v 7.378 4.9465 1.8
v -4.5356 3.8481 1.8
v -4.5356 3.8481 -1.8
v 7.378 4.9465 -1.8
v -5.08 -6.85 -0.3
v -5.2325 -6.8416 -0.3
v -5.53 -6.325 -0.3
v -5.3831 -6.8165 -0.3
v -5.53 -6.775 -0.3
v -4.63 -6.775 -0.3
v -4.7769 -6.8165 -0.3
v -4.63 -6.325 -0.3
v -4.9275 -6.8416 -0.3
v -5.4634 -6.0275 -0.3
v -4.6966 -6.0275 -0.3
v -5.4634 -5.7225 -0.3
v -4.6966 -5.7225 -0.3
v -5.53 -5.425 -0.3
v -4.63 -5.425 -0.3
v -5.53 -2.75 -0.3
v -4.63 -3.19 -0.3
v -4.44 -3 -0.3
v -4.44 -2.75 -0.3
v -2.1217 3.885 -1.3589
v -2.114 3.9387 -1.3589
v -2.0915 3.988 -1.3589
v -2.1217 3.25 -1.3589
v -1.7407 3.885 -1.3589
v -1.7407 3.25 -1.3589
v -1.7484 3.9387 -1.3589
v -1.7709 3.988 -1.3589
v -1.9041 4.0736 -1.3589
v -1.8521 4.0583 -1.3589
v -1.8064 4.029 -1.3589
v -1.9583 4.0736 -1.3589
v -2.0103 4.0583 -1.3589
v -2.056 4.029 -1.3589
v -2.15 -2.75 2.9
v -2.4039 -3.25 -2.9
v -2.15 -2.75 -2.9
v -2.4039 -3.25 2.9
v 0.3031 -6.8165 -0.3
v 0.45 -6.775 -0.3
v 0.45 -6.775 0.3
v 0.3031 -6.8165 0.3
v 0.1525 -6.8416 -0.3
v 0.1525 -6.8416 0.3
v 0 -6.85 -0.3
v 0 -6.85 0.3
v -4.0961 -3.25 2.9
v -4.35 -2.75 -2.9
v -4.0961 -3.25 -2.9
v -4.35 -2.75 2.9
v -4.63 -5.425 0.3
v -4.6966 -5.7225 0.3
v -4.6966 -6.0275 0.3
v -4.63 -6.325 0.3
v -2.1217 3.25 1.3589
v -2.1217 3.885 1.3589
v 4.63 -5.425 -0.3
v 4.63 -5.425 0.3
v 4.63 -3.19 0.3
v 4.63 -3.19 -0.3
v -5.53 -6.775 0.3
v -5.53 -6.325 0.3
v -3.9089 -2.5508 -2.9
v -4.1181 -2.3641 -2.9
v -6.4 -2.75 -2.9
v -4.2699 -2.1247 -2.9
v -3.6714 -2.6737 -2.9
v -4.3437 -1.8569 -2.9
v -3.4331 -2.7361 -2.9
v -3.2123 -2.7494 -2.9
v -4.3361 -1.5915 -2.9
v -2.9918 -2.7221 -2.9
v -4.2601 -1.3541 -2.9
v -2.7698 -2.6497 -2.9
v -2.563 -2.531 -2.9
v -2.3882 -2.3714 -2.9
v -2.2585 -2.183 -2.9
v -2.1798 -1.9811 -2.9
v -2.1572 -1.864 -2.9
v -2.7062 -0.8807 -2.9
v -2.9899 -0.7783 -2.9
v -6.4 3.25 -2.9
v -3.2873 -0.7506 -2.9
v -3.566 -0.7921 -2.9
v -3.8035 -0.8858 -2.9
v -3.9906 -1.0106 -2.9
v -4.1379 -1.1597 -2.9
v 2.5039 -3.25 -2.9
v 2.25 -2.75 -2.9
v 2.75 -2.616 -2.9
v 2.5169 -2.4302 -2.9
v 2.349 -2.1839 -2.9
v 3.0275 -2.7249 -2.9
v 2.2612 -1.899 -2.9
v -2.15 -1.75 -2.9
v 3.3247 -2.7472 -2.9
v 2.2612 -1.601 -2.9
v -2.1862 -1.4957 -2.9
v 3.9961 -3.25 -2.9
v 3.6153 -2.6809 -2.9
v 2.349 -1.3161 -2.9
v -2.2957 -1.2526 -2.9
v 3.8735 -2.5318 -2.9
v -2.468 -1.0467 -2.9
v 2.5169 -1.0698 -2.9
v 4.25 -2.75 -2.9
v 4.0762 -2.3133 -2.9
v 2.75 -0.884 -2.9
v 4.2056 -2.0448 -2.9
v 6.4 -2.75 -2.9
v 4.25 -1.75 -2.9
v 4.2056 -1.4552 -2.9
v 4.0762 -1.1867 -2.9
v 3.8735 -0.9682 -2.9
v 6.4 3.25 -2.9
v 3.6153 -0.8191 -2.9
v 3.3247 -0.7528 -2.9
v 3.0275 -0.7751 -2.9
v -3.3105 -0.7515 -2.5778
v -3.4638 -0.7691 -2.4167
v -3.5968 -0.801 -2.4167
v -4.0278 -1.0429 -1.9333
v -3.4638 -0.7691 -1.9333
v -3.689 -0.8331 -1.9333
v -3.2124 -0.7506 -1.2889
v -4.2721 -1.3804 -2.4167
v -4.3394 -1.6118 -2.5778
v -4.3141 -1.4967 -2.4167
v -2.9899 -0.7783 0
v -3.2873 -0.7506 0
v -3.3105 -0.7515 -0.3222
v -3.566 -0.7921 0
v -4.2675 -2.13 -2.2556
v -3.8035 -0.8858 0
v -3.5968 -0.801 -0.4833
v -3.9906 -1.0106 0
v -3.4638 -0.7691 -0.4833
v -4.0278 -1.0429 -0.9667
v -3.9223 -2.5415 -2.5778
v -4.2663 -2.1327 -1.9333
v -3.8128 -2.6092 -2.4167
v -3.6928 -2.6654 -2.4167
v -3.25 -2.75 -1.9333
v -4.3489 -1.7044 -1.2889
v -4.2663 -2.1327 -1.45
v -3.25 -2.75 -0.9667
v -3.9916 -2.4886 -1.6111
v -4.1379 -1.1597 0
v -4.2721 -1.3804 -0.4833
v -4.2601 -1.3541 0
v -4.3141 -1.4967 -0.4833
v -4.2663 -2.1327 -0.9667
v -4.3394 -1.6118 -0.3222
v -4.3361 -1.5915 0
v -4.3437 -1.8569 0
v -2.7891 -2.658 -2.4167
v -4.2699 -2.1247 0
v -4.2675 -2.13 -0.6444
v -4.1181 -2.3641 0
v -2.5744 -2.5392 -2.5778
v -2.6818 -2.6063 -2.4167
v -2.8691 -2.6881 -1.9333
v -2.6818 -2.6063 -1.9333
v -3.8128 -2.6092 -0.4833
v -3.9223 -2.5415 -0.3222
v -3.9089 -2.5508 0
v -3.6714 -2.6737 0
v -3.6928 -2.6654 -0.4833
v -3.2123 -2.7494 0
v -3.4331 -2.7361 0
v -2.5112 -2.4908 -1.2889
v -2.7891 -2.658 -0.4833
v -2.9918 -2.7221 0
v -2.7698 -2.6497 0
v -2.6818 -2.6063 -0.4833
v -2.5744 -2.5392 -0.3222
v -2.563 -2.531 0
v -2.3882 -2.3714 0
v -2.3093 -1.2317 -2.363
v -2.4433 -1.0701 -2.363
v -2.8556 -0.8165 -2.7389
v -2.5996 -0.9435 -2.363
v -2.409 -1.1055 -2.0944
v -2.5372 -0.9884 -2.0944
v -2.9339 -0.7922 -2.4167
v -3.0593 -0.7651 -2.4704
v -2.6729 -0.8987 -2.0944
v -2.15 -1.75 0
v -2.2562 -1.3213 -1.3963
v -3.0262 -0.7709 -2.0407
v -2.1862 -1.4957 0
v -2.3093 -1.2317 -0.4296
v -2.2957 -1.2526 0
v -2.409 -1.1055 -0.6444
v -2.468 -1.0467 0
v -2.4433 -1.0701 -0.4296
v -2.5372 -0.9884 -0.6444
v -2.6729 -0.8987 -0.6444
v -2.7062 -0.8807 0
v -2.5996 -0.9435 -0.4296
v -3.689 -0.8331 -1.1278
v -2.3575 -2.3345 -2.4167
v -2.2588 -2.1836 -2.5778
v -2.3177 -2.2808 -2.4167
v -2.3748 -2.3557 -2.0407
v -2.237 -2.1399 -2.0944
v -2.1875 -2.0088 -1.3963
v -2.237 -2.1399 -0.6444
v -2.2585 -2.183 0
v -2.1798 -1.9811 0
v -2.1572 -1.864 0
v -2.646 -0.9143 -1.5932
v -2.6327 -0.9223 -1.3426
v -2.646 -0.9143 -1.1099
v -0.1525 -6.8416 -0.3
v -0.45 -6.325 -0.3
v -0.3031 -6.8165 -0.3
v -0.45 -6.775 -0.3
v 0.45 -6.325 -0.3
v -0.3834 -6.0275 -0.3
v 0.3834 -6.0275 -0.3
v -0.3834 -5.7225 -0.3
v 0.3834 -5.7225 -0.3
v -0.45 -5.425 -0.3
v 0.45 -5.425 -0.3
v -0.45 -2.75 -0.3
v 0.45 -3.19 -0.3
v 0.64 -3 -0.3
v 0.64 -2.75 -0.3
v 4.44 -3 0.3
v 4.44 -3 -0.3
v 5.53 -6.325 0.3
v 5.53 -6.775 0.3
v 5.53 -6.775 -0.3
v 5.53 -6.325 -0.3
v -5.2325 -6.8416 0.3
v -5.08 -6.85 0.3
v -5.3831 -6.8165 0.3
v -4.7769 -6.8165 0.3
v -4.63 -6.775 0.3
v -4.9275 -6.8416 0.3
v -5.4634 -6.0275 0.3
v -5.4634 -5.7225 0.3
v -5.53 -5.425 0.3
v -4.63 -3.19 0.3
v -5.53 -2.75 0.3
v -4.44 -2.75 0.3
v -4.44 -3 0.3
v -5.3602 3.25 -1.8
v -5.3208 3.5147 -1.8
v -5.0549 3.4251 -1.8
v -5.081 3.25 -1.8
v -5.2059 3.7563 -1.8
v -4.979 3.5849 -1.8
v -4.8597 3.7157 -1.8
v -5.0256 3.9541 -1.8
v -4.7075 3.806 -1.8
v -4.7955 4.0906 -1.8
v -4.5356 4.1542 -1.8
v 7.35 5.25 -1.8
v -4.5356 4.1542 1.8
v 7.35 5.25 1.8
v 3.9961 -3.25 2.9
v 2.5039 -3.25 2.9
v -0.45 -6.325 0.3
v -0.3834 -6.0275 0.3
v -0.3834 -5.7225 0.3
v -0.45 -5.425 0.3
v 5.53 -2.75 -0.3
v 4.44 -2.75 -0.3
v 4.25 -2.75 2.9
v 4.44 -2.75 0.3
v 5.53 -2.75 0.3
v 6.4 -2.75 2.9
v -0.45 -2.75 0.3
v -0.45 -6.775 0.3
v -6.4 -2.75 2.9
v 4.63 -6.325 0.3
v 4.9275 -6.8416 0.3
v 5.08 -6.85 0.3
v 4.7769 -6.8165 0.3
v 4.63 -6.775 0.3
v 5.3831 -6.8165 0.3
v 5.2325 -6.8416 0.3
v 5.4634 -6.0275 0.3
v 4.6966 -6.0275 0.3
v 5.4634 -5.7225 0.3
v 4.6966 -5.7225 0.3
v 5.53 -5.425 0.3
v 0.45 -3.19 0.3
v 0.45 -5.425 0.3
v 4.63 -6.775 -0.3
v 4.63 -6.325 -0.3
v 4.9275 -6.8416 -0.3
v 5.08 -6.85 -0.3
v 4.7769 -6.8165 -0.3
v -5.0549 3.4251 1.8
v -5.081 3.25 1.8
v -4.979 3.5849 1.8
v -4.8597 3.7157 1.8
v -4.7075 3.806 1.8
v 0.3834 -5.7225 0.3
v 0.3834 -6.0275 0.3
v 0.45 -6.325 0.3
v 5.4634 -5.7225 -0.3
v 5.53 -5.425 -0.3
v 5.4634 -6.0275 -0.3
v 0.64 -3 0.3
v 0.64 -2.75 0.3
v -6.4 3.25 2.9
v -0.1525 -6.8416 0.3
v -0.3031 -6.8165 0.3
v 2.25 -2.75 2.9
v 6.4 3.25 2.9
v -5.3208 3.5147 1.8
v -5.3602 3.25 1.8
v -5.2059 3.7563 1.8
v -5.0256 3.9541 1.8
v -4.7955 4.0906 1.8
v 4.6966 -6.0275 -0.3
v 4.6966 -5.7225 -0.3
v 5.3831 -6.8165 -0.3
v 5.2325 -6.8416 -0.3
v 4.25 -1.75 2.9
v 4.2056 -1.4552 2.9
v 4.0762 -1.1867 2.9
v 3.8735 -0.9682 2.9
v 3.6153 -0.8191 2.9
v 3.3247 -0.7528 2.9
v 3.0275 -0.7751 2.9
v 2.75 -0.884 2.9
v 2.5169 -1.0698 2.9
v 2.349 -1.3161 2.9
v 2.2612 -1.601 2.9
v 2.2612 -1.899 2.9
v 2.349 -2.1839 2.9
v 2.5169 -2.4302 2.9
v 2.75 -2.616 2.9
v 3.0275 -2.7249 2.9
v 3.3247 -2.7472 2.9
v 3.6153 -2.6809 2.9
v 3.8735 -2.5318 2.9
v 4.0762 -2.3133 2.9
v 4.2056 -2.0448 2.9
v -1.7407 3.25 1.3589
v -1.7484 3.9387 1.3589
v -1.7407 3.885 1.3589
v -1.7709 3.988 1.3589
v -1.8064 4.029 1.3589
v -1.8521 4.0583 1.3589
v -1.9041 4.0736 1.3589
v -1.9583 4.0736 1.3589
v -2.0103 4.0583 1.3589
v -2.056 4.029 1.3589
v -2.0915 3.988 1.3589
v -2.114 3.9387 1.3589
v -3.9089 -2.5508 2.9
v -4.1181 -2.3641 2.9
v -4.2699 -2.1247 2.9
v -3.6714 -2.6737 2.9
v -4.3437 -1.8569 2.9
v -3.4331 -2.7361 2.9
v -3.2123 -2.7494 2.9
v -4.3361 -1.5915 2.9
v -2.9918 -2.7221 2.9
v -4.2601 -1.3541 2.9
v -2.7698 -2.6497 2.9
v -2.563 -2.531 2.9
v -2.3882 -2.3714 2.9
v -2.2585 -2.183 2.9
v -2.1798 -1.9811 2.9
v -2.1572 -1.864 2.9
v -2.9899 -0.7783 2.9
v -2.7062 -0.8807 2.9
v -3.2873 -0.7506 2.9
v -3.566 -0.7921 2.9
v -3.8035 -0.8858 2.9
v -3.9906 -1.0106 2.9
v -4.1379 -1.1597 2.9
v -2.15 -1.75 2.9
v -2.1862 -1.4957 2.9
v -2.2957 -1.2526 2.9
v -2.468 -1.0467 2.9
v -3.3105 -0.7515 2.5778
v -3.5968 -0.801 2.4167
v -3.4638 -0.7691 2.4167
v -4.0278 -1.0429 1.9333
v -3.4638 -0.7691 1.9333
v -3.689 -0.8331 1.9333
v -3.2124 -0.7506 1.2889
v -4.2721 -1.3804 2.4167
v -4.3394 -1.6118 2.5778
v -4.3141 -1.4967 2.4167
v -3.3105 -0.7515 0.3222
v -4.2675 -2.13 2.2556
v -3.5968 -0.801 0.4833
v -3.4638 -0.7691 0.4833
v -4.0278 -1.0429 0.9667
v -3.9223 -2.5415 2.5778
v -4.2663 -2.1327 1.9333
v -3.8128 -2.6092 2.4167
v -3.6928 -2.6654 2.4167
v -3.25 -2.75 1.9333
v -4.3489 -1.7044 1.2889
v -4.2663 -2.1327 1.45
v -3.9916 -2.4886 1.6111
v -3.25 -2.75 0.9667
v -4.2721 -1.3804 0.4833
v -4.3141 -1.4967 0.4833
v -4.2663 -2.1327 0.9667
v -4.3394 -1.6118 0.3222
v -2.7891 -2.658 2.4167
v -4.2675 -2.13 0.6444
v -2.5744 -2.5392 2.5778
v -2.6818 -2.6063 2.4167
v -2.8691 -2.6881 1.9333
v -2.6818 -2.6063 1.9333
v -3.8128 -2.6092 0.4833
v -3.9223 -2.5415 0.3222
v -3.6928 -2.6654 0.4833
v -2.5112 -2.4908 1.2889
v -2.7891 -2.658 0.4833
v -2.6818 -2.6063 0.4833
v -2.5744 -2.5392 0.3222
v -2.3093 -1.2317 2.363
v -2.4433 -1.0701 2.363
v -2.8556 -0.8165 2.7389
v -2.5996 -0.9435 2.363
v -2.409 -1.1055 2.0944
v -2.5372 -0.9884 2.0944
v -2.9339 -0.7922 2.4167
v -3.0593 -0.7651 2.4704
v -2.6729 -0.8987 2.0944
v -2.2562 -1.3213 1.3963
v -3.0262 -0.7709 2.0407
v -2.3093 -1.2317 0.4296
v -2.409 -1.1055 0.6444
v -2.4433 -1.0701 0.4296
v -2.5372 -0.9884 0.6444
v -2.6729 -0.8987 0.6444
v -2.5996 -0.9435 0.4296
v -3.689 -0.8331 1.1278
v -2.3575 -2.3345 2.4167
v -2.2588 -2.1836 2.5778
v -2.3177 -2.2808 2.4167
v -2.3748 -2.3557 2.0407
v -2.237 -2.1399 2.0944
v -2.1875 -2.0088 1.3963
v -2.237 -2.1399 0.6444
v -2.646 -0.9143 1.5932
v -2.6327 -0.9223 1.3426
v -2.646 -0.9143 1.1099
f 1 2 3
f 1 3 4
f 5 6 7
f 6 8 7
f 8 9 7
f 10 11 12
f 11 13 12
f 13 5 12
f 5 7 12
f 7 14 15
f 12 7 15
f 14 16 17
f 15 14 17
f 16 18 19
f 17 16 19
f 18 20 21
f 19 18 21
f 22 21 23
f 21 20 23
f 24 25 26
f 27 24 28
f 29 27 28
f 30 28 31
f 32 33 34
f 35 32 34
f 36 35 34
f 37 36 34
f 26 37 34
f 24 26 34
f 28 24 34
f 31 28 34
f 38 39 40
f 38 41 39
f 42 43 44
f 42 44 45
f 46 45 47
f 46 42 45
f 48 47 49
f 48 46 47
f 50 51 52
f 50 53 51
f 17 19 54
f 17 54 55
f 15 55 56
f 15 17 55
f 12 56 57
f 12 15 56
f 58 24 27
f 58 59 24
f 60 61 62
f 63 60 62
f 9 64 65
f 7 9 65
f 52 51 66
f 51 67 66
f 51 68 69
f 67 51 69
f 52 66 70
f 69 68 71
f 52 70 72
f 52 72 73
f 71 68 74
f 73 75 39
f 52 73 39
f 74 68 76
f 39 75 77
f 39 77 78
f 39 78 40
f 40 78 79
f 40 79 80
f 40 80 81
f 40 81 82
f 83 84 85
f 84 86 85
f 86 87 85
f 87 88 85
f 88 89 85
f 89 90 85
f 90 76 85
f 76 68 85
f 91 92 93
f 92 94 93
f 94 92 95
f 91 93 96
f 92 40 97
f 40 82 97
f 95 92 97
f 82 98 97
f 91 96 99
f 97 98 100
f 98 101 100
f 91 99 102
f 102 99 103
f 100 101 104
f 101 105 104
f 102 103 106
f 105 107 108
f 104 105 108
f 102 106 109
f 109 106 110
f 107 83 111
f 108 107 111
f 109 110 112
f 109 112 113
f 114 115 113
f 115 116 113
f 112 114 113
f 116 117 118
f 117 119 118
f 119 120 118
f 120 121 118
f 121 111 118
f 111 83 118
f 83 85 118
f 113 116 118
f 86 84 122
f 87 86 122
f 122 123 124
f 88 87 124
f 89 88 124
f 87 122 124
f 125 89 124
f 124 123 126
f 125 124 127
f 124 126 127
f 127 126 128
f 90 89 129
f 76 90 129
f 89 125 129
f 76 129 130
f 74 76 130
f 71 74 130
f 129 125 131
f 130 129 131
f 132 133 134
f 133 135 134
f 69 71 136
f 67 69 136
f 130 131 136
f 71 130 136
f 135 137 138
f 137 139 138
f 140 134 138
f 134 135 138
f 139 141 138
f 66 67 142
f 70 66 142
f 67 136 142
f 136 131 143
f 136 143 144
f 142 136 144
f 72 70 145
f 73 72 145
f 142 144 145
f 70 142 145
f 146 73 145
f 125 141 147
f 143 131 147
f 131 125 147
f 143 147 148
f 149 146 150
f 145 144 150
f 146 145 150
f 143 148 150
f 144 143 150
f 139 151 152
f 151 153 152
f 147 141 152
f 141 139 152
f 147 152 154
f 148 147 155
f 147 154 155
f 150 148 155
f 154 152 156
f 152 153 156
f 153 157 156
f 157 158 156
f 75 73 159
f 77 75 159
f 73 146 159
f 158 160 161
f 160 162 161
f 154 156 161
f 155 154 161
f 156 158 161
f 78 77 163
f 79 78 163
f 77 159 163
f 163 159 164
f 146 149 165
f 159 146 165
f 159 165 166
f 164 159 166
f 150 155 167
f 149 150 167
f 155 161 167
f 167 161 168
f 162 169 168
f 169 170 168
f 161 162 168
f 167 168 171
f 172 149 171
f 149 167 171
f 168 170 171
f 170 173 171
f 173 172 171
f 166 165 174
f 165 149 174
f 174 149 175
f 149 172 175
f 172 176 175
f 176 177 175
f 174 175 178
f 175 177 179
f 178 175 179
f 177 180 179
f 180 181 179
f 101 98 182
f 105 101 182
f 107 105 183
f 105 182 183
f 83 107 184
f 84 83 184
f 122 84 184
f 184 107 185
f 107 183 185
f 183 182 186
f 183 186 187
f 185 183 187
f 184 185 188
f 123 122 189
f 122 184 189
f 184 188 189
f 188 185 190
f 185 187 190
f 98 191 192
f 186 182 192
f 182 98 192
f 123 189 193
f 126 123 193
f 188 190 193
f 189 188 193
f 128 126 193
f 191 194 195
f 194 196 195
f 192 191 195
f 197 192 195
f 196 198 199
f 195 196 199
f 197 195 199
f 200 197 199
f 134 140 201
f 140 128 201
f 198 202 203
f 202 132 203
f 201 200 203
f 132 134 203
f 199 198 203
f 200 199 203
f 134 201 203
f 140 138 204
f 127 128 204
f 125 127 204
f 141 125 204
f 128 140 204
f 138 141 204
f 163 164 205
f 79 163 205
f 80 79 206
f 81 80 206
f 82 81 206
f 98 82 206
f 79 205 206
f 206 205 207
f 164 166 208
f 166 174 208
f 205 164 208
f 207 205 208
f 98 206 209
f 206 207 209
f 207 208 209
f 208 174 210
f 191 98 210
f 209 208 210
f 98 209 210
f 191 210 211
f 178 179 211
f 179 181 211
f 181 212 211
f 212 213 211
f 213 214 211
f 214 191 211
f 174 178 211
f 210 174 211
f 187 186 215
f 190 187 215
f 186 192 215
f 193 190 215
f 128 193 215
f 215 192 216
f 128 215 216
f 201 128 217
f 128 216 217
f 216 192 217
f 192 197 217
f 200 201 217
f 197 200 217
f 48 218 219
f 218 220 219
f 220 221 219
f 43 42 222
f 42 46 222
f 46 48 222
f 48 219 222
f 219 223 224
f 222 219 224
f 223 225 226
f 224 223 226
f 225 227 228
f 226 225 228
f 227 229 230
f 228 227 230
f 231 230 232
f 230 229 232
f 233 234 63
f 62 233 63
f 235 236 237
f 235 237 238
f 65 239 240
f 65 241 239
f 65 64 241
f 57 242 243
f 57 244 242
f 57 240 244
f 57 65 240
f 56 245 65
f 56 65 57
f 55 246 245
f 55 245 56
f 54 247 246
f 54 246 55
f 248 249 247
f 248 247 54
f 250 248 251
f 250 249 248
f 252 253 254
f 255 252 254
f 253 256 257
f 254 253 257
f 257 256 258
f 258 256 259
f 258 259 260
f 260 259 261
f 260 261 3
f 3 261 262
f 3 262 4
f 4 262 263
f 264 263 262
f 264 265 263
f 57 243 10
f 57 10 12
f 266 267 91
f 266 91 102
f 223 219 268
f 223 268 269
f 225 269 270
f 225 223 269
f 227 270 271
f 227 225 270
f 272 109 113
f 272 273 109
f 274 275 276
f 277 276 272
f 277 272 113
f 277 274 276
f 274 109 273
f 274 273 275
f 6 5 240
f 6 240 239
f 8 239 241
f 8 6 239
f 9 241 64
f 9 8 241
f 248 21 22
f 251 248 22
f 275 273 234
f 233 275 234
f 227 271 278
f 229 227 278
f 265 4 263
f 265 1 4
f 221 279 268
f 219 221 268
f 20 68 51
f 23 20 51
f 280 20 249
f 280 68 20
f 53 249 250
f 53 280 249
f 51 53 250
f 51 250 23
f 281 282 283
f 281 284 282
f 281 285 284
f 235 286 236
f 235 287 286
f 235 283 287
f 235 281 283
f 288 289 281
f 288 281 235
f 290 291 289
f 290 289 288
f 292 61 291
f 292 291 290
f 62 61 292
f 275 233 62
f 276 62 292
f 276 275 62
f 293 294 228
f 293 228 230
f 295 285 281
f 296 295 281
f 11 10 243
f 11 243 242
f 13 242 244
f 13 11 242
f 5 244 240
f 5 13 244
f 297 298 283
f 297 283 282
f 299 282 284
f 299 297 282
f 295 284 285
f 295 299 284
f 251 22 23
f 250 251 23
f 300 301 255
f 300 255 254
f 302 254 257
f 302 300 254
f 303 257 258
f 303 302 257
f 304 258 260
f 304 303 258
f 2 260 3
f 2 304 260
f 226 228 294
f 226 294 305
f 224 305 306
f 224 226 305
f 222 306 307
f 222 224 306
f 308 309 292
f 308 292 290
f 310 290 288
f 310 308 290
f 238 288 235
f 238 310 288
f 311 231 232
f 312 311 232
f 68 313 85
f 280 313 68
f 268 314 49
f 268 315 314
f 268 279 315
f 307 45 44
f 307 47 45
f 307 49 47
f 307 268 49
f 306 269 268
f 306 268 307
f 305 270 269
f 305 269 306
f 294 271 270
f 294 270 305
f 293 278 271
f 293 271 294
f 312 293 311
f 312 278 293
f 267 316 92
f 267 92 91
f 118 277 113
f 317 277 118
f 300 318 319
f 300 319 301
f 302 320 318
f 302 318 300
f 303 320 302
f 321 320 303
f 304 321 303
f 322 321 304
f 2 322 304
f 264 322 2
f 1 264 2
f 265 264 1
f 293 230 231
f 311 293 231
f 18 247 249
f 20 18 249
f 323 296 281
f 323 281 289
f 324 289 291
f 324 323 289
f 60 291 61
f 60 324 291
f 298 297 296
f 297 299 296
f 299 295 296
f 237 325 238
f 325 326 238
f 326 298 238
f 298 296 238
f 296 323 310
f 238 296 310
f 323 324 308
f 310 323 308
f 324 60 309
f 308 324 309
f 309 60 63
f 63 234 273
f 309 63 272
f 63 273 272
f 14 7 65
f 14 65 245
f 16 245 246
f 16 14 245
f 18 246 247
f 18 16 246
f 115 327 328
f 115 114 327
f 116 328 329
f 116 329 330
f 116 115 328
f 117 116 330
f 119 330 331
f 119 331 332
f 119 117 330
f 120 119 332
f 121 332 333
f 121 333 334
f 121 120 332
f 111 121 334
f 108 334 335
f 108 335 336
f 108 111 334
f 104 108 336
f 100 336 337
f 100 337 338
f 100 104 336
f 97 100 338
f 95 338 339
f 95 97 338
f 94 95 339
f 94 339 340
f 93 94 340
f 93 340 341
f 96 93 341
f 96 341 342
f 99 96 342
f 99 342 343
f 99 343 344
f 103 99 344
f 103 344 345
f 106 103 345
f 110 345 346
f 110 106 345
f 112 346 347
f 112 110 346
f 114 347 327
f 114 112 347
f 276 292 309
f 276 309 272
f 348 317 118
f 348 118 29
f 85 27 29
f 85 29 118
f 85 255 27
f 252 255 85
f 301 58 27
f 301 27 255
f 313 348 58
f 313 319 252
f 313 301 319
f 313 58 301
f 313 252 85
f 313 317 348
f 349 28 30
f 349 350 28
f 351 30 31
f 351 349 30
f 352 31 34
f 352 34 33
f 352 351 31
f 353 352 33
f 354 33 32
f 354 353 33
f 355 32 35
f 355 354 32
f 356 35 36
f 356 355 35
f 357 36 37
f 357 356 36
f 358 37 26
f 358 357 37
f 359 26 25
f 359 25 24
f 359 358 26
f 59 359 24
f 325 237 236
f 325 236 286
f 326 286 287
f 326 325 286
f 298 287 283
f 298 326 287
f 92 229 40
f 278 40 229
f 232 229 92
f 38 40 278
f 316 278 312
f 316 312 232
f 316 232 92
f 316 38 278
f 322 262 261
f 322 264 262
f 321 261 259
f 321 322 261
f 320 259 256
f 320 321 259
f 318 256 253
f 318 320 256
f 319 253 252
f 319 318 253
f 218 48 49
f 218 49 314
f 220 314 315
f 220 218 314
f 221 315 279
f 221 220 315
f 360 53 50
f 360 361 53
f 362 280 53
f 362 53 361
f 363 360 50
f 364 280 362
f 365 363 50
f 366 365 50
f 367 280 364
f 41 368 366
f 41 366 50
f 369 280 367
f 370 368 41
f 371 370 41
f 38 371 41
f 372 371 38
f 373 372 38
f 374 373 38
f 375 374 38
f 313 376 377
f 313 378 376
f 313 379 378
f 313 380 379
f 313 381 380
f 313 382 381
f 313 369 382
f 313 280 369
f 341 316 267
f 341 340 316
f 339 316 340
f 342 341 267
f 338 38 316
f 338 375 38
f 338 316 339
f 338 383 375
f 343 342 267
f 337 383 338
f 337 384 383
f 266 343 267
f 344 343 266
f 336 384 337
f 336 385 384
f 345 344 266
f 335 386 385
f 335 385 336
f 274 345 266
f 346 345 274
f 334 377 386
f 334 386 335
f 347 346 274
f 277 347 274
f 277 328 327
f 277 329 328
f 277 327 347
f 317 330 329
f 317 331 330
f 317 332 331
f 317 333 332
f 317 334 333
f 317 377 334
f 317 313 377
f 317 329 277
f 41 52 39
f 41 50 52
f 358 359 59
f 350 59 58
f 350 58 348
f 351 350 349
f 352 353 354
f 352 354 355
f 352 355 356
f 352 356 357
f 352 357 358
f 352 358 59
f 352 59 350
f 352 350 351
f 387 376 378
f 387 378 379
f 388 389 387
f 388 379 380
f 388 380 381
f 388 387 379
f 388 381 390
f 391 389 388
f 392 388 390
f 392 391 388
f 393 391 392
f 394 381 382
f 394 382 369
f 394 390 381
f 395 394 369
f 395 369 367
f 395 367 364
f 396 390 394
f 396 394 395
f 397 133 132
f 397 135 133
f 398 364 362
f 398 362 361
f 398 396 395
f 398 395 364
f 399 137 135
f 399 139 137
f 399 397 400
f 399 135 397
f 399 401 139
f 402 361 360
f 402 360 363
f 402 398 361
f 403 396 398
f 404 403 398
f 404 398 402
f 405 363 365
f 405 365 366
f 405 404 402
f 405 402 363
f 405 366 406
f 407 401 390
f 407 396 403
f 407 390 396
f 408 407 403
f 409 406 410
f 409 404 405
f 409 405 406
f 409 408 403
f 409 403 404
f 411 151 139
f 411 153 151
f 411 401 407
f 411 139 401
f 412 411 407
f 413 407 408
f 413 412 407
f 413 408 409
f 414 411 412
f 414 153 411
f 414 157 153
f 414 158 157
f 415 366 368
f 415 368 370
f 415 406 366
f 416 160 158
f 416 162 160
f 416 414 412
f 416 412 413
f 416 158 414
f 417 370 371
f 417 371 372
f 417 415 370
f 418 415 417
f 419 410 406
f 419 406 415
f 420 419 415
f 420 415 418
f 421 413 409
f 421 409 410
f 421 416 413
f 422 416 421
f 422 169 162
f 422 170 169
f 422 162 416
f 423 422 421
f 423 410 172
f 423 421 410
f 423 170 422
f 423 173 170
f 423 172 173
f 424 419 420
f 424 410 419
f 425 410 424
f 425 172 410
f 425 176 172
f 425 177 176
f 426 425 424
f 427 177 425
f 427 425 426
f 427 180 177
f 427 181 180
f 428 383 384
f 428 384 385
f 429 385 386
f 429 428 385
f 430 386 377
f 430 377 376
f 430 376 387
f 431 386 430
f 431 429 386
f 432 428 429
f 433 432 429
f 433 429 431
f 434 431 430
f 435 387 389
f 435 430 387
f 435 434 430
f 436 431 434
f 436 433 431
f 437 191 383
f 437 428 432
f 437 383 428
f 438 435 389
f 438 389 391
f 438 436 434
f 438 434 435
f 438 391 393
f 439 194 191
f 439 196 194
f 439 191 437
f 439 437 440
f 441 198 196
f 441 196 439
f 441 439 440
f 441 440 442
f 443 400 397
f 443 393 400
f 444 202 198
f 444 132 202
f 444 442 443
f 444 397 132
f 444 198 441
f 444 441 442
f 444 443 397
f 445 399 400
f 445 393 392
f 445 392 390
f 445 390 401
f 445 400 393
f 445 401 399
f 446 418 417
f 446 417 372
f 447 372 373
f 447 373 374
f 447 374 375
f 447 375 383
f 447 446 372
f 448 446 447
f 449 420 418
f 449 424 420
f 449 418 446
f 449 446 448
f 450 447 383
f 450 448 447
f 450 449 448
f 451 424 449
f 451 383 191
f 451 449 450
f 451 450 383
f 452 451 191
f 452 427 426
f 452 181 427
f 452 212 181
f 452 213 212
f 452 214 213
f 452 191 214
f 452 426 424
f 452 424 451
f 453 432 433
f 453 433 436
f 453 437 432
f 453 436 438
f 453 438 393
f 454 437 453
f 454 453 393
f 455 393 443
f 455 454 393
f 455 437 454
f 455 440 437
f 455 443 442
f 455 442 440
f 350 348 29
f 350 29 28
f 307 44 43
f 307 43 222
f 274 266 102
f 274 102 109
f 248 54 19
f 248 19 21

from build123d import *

# Parameters (mm, degrees)
SKETCH1_R               = 1
BOSS_EXTRUDE1_DEPTH     = 2.9
BOSS_EXTRUDE2_DEPTH     = 1.8
BOSS_EXTRUDE3_DEPTH     = 1.3589
SKETCH1_5_W             = 0.9
SKETCH1_5_H             = 4.1
BOSS_EXTRUDE4_DEPTH     = 0.3
BOSS_EXTRUDE4_2_DEPTH   = 0.3
BOSS_EXTRUDE4_3_DEPTH   = 0.3
CUT_EXTRUDE4_DEPTH      = 11.476981306
CUT_EXTRUDE4_DEPTH_BACK = 11.476981306
CUT_EXTRUDE5_DEPTH      = 11.476981306
CUT_EXTRUDE5_DEPTH_BACK = 11.476981306
CUT_EXTRUDE6_DEPTH      = 11.476981306
CUT_EXTRUDE6_DEPTH_BACK = 11.476981306
BOSS_EXTRUDE5_START     = -0.3
BOSS_EXTRUDE5_DEPTH     = 0.6


with BuildPart() as part:
    # Sketch1 → Boss-Extrude1 (new, symmetric)
    with BuildSketch(Plane.XY):
        Polygon((-2.15, -2.75), (2.25, -2.75), (2.50390625, -3.25), (3.99609375, -3.25), (4.25, -2.75), (6.4, -2.75), (6.4, 3.25), (-6.4, 3.25), (-6.4, -2.75), (-4.35, -2.75), (-4.09609375, -3.25), (-2.40390625, -3.25), align=None)
        with BuildLine():
            add(Edge.make_bspline(
                [(-3.25, -2.75), (-2.15, -2.75), (-2.15, -1.75)],
                knots=[4.71238898, 4.71238898, 4.71238898, 6.283185307, 6.283185307, 6.283185307], degree=2, weights=[1, 0.707106781, 1]))
            add(Edge.make_bspline(
                [(-2.15, -1.75), (-2.15, 0.664213562), (-4.027817459, -1.042893219), (-5.905634919, -2.75), (-3.25, -2.75)],
                knots=[0, 0, 0, 2.35619449, 2.35619449, 4.71238898, 4.71238898, 4.71238898], degree=2, weights=[1, 0.382683432, 1, 0.382683432, 1]))
        make_face(mode=Mode.SUBTRACT)
        with Locations((3.25, -1.75)):
            Circle(SKETCH1_R, mode=Mode.SUBTRACT)
    extrude(amount=BOSS_EXTRUDE1_DEPTH, both=True)

    # Sketch1<3> → Boss-Extrude2 (add, symmetric)
    with BuildSketch(Plane.XY):
        with BuildLine():
            ThreePointArc((-4.535551444, 4.15417696), (-5.12307576, 3.861878504), (-5.3602, 3.25))
            Line((-5.3602, 3.25), (-5.081030172, 3.25))
            ThreePointArc((-5.081030172, 3.25), (-4.924180047, 3.654738123), (-4.535551444, 3.848084232))
            Line((-4.535551444, 3.848084232), (7.37798324, 4.946487268))
            Line((7.37798324, 4.946487268), (7.35, 5.25))
            Line((7.35, 5.25), (-4.535551444, 4.15417696))
        make_face()
    extrude(amount=BOSS_EXTRUDE2_DEPTH, both=True)

    # Sketch1<4> → Boss-Extrude3 (add, symmetric)
    with BuildSketch(Plane.XY):
        with BuildLine():
            Line((-2.1217, 3.885), (-2.1217, 3.25))
            Line((-2.1217, 3.25), (-1.7407, 3.25))
            Line((-1.7407, 3.25), (-1.7407, 3.885))
            ThreePointArc((-1.7407, 3.885), (-1.9312, 4.0755), (-2.1217, 3.885))
        make_face()
    extrude(amount=BOSS_EXTRUDE3_DEPTH, both=True)



with BuildPart() as body_2:
    # Sketch1<5> → Boss-Extrude4 (new, symmetric)
    with BuildSketch(Plane.XY):
        with Locations((-5.08, -4.8)):
            Rectangle(SKETCH1_5_W, SKETCH1_5_H)
    extrude(amount=BOSS_EXTRUDE4_DEPTH, both=True)

    # Sketch2<4> → Cut-Extrude5 (cut, two sides: drawn at the far end of the back side and taken through both)
    with BuildSketch(Plane.XY.offset(-CUT_EXTRUDE5_DEPTH_BACK)):
        with BuildLine():
            ThreePointArc((-4.63, -5.4250018), (-4.705, -5.8750009), (-4.63, -6.325))
            Line((-4.63, -6.325), (-4.63, -5.4250018))
        make_face()
        with BuildLine():
            Line((-5.08, -6.85), (-4.63, -6.85))
            Line((-4.63, -6.85), (-4.63, -6.775))
            ThreePointArc((-4.63, -6.775), (-4.851896405, -6.831121569), (-5.08, -6.85))
        make_face()
        with BuildLine():
            Line((-5.53, -6.85), (-5.08, -6.85))
            ThreePointArc((-5.08, -6.85), (-5.308103595, -6.831121569), (-5.53, -6.775))
            Line((-5.53, -6.775), (-5.53, -6.85))
        make_face()
        with BuildLine():
            Line((-5.53, -5.4250018), (-5.53, -6.325))
            ThreePointArc((-5.53, -6.325), (-5.455, -5.8750009), (-5.53, -5.4250018))
        make_face()
    extrude(amount=CUT_EXTRUDE5_DEPTH + CUT_EXTRUDE5_DEPTH_BACK, mode=Mode.SUBTRACT)


with BuildPart() as body_3:
    # Sketch1<5> → Boss-Extrude4 2 (new, symmetric)
    with BuildSketch(Plane.XY):
        with Locations((0, -4.8)):
            Rectangle(SKETCH1_5_W, SKETCH1_5_H)
    extrude(amount=BOSS_EXTRUDE4_2_DEPTH, both=True)

    # Sketch2 → Cut-Extrude4 (cut, two sides: drawn at the far end of the back side and taken through both)
    with BuildSketch(Plane.XY.offset(-CUT_EXTRUDE4_DEPTH_BACK)):
        with BuildLine():
            ThreePointArc((5.53, -5.4250018), (5.455, -5.8750009), (5.53, -6.325))
            Line((5.53, -6.325), (5.53, -5.4250018))
        make_face()
        with BuildLine():
            Line((4.63, -5.4250018), (4.63, -6.325))
            ThreePointArc((4.63, -6.325), (4.705, -5.8750009), (4.63, -5.4250018))
        make_face()
        with BuildLine():
            ThreePointArc((5.53, -6.775), (5.308103595, -6.831121569), (5.08, -6.85))
            Line((5.08, -6.85), (5.53, -6.85))
            Line((5.53, -6.85), (5.53, -6.775))
        make_face()
        with BuildLine():
            Line((4.63, -6.775), (4.63, -6.85))
            Line((4.63, -6.85), (5.08, -6.85))
            ThreePointArc((5.08, -6.85), (4.851896405, -6.831121569), (4.63, -6.775))
        make_face()
        with BuildLine():
            ThreePointArc((0.45, -5.4250018), (0.375, -5.8750009), (0.45, -6.325))
            Line((0.45, -6.325), (0.45, -5.4250018))
        make_face()
        with BuildLine():
            Line((-0.45, -5.4250018), (-0.45, -6.325))
            ThreePointArc((-0.45, -6.325), (-0.375, -5.8750009), (-0.45, -5.4250018))
        make_face()
        with BuildLine():
            Line((-0.45, -6.85), (0, -6.85))
            ThreePointArc((0, -6.85), (-0.228103595, -6.831121569), (-0.45, -6.775))
            Line((-0.45, -6.775), (-0.45, -6.85))
        make_face()
        with BuildLine():
            Line((0, -6.85), (0.45, -6.85))
            Line((0.45, -6.85), (0.45, -6.775))
            ThreePointArc((0.45, -6.775), (0.228103595, -6.831121569), (0, -6.85))
        make_face()
        with BuildLine():
            ThreePointArc((-4.63, -5.4250018), (-4.705, -5.8750009), (-4.63, -6.325))
            Line((-4.63, -6.325), (-4.63, -5.4250018))
        make_face()
        with BuildLine():
            Line((-5.08, -6.85), (-4.63, -6.85))
            Line((-4.63, -6.85), (-4.63, -6.775))
            ThreePointArc((-4.63, -6.775), (-4.851896405, -6.831121569), (-5.08, -6.85))
        make_face()
        with BuildLine():
            Line((-5.53, -6.85), (-5.08, -6.85))
            ThreePointArc((-5.08, -6.85), (-5.308103595, -6.831121569), (-5.53, -6.775))
            Line((-5.53, -6.775), (-5.53, -6.85))
        make_face()
        with BuildLine():
            Line((-5.53, -5.4250018), (-5.53, -6.325))
            ThreePointArc((-5.53, -6.325), (-5.455, -5.8750009), (-5.53, -5.4250018))
        make_face()
    extrude(amount=CUT_EXTRUDE4_DEPTH + CUT_EXTRUDE4_DEPTH_BACK, mode=Mode.SUBTRACT)


with BuildPart() as body_4:
    # Sketch1<5> → Boss-Extrude4 3 (new, symmetric)
    with BuildSketch(Plane.XY):
        with Locations((5.08, -4.8)):
            Rectangle(SKETCH1_5_W, SKETCH1_5_H)
    extrude(amount=BOSS_EXTRUDE4_3_DEPTH, both=True)

    # Sketch2<5> → Cut-Extrude6 (cut, two sides: drawn at the far end of the back side and taken through both)
    with BuildSketch(Plane.XY.offset(-CUT_EXTRUDE6_DEPTH_BACK)):
        with BuildLine():
            Line((4.63, -5.4250018), (4.63, -6.325))
            ThreePointArc((4.63, -6.325), (4.705, -5.8750009), (4.63, -5.4250018))
        make_face()
        with BuildLine():
            ThreePointArc((5.53, -5.4250018), (5.455, -5.8750009), (5.53, -6.325))
            Line((5.53, -6.325), (5.53, -5.4250018))
        make_face()
        with BuildLine():
            ThreePointArc((5.53, -6.775), (5.308103595, -6.831121569), (5.08, -6.85))
            Line((5.08, -6.85), (5.53, -6.85))
            Line((5.53, -6.85), (5.53, -6.775))
        make_face()
        with BuildLine():
            Line((4.63, -6.775), (4.63, -6.85))
            Line((4.63, -6.85), (5.08, -6.85))
            ThreePointArc((5.08, -6.85), (4.851896405, -6.831121569), (4.63, -6.775))
        make_face()
    extrude(amount=CUT_EXTRUDE6_DEPTH + CUT_EXTRUDE6_DEPTH_BACK, mode=Mode.SUBTRACT)


with BuildPart() as part_1:
    add(part.part)

    add(body_2.part)  # Boss-Extrude5 merges body 2

    add(body_3.part)  # Boss-Extrude5 merges body 3

    add(body_4.part)  # Boss-Extrude5 merges body 4
    # Sketch2<7> → Boss-Extrude5 (add)
    with BuildSketch(Plane.XY.offset(BOSS_EXTRUDE5_START)):
        Polygon((4.44, -3), (4.63, -3.19), (4.63, -2.75), (4.44, -2.75), align=None)
        Polygon((0.45, -2.75), (0.45, -3.19), (0.64, -3), (0.64, -2.75), align=None)
        Polygon((-4.63, -2.75), (-4.63, -3.19), (-4.44, -3), (-4.44, -2.75), align=None)
    extrude(amount=BOSS_EXTRUDE5_DEPTH)


solid = part_1.part
